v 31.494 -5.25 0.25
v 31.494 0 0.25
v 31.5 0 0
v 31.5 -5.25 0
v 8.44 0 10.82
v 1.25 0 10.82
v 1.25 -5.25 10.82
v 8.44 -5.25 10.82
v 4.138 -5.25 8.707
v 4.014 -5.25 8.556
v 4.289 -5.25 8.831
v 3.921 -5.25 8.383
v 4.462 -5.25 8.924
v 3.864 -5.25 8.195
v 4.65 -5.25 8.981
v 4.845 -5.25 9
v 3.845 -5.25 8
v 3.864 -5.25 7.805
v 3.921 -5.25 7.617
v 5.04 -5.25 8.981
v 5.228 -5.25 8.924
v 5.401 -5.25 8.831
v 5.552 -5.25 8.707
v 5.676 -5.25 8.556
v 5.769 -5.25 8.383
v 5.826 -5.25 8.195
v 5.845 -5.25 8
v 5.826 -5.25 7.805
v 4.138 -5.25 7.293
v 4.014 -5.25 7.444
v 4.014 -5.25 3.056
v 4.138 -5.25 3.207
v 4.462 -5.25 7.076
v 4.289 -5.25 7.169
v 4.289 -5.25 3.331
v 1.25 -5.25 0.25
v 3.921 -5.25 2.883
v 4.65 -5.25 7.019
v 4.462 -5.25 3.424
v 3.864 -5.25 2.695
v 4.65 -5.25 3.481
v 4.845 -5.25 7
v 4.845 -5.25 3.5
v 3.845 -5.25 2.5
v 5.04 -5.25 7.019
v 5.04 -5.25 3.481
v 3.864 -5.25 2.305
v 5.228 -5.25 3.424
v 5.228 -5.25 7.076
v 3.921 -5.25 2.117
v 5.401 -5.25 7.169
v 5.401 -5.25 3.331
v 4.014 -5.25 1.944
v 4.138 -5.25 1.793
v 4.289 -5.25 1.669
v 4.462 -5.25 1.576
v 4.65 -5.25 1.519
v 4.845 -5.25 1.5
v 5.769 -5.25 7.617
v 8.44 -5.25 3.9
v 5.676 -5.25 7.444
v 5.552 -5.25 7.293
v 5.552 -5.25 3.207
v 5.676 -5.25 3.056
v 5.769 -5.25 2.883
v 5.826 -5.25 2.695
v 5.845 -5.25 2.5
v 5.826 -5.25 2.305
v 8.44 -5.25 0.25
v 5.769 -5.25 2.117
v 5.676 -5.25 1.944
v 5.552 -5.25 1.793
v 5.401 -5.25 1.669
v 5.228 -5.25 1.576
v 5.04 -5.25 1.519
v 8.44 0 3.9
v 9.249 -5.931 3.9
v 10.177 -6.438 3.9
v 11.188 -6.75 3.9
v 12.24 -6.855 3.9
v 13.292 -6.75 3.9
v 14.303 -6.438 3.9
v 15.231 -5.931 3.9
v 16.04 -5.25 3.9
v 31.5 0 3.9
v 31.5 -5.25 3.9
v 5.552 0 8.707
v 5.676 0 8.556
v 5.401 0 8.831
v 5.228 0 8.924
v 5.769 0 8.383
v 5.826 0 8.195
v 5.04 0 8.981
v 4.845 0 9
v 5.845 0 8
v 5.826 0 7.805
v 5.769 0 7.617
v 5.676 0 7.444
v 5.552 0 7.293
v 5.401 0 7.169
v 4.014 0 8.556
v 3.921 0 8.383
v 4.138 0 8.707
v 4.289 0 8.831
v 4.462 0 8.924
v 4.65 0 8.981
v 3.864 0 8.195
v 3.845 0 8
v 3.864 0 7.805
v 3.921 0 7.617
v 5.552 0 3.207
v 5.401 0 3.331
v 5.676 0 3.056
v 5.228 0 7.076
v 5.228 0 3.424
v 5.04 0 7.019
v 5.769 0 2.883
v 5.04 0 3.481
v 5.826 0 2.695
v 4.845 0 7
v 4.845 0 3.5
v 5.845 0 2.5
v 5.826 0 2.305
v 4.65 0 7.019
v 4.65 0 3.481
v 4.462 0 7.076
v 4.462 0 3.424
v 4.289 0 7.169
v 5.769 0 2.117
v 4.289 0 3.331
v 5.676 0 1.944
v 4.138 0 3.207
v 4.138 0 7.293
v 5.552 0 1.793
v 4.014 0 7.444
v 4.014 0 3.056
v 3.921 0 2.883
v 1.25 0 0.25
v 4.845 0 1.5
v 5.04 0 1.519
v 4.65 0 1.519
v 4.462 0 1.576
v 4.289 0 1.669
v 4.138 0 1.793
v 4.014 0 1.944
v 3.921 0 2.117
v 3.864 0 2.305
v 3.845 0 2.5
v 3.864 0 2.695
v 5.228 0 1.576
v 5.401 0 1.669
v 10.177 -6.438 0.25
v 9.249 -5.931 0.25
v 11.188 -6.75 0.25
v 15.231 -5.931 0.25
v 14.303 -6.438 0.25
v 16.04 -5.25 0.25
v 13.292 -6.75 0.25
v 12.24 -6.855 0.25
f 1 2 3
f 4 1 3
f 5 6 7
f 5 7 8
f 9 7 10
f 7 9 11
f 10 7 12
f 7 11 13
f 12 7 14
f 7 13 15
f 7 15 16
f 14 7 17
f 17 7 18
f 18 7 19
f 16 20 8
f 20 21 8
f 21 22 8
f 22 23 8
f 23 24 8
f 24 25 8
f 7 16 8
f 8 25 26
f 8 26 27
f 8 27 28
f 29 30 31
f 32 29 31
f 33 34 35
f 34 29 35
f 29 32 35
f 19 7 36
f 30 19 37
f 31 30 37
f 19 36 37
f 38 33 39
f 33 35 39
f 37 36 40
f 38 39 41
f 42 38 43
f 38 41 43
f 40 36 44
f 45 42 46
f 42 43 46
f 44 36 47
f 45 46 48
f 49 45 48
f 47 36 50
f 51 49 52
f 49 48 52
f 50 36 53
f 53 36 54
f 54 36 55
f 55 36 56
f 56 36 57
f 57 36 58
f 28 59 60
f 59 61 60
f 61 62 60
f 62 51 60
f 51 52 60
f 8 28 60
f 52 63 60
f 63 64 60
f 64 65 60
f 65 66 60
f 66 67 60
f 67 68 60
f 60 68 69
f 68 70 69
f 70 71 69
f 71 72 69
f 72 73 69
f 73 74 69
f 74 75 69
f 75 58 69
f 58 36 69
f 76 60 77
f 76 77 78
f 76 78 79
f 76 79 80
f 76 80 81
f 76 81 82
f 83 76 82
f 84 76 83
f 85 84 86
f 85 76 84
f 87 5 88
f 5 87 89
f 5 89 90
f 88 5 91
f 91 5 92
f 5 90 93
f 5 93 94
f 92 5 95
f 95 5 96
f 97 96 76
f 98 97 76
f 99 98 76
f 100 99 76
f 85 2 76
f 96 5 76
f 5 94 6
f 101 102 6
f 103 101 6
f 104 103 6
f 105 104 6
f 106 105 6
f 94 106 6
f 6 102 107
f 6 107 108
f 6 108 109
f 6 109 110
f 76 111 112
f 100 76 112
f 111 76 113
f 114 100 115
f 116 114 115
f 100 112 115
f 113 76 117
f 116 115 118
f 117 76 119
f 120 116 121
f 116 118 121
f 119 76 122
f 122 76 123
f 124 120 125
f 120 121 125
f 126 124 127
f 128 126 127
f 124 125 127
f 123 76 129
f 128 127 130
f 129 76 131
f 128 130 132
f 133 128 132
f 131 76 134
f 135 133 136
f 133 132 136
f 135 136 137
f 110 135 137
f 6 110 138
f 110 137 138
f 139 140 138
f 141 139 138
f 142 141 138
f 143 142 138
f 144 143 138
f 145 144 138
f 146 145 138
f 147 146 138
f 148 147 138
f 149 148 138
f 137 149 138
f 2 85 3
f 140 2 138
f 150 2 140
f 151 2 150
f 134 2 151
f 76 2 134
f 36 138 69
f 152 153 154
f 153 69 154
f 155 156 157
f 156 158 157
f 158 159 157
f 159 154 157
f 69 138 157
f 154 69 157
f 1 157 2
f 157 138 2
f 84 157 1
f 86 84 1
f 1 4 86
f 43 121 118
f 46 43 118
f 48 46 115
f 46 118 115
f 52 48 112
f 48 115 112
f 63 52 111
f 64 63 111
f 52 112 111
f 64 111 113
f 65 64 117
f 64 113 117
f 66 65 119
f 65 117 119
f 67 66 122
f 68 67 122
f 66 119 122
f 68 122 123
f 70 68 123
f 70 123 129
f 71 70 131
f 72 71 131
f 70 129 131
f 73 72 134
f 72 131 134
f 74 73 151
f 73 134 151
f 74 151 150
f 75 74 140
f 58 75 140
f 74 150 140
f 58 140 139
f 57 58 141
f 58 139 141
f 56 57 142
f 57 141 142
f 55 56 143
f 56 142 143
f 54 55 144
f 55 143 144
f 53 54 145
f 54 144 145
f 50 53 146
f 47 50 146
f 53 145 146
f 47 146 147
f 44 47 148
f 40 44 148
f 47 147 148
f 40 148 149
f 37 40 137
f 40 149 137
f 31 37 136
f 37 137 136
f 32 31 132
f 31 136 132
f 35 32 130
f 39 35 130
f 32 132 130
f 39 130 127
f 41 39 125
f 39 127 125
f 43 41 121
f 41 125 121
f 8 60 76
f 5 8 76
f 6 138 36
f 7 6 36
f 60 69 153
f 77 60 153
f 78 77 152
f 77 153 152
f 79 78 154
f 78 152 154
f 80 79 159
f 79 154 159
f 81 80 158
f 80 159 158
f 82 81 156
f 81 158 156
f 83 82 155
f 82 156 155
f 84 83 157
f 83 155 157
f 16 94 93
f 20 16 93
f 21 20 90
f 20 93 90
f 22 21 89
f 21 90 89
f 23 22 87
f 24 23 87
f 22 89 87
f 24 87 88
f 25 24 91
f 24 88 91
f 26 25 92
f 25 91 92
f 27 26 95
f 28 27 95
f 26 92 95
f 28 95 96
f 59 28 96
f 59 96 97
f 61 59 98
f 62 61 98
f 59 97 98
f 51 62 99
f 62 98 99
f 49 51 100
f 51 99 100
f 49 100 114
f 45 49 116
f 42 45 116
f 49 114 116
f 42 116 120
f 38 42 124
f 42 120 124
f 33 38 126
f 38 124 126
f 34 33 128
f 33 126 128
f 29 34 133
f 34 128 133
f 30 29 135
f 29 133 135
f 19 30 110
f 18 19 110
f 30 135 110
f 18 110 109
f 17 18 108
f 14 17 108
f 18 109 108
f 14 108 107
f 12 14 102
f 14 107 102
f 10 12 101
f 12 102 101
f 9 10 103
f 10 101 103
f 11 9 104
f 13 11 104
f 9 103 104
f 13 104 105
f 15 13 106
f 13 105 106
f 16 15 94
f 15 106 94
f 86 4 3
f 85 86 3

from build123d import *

# Parameters (mm, degrees)
BOSS_EXTRUDE3_DEPTH = 10.82
BOSS_EXTRUDE4_DEPTH = 3.9
SKETCH3_R           = 1
CUT_EXTRUDE1_DEPTH  = 5.25
CUT_EXTRUDE2_DEPTH  = 10


with BuildPart() as part:
    # Sketch2 → Boss-Extrude3 (new body)
    with BuildSketch(Plane.XY):
        Polygon((8.44, 0), (3, 0), (1.25, 0), (1.25, -5.25), (3, -5.25), (8.44, -5.25), align=None)
    extrude(amount=BOSS_EXTRUDE3_DEPTH)

    # Sketch2<5> → Boss-Extrude4 (add)
    with BuildSketch(Plane.XY):
        with BuildLine():
            Line((31.5, 0), (8.44, 0))
            Line((8.44, 0), (8.44, -5.25))
            ThreePointArc((8.44, -5.25), (12.24, -6.85540936), (16.04, -5.25))
            Line((16.04, -5.25), (31.5, -5.25))
            Line((31.5, -5.25), (31.5, 0))
        make_face()
    extrude(amount=BOSS_EXTRUDE4_DEPTH)

    # Sketch3 → Cut-Extrude1 (cut)
    with BuildSketch(Plane(origin=(0, 0, 0), x_dir=(1, 0, 0), z_dir=(0, 1, 0))):
        with Locations(Location((4.845, -2.5, 0), (0, 0, 270))):
            Circle(SKETCH3_R)
        with Locations(Location((4.845, -8, 0), (0, 0, 270))):
            Circle(SKETCH3_R)
    extrude(amount=-CUT_EXTRUDE1_DEPTH, mode=Mode.SUBTRACT)

    # Sketch4 → Cut-Extrude2 (cut)
    with BuildSketch(Plane(origin=(0, 0, 0), x_dir=(1, 0, 0), z_dir=(0, 1, 0))):
        Polygon((1.25, 0), (1.25, -0.249924402), (31.493852375, -0.249924402), (31.5, 0), align=None)
    extrude(amount=-CUT_EXTRUDE2_DEPTH, mode=Mode.SUBTRACT)


solid = part.part
